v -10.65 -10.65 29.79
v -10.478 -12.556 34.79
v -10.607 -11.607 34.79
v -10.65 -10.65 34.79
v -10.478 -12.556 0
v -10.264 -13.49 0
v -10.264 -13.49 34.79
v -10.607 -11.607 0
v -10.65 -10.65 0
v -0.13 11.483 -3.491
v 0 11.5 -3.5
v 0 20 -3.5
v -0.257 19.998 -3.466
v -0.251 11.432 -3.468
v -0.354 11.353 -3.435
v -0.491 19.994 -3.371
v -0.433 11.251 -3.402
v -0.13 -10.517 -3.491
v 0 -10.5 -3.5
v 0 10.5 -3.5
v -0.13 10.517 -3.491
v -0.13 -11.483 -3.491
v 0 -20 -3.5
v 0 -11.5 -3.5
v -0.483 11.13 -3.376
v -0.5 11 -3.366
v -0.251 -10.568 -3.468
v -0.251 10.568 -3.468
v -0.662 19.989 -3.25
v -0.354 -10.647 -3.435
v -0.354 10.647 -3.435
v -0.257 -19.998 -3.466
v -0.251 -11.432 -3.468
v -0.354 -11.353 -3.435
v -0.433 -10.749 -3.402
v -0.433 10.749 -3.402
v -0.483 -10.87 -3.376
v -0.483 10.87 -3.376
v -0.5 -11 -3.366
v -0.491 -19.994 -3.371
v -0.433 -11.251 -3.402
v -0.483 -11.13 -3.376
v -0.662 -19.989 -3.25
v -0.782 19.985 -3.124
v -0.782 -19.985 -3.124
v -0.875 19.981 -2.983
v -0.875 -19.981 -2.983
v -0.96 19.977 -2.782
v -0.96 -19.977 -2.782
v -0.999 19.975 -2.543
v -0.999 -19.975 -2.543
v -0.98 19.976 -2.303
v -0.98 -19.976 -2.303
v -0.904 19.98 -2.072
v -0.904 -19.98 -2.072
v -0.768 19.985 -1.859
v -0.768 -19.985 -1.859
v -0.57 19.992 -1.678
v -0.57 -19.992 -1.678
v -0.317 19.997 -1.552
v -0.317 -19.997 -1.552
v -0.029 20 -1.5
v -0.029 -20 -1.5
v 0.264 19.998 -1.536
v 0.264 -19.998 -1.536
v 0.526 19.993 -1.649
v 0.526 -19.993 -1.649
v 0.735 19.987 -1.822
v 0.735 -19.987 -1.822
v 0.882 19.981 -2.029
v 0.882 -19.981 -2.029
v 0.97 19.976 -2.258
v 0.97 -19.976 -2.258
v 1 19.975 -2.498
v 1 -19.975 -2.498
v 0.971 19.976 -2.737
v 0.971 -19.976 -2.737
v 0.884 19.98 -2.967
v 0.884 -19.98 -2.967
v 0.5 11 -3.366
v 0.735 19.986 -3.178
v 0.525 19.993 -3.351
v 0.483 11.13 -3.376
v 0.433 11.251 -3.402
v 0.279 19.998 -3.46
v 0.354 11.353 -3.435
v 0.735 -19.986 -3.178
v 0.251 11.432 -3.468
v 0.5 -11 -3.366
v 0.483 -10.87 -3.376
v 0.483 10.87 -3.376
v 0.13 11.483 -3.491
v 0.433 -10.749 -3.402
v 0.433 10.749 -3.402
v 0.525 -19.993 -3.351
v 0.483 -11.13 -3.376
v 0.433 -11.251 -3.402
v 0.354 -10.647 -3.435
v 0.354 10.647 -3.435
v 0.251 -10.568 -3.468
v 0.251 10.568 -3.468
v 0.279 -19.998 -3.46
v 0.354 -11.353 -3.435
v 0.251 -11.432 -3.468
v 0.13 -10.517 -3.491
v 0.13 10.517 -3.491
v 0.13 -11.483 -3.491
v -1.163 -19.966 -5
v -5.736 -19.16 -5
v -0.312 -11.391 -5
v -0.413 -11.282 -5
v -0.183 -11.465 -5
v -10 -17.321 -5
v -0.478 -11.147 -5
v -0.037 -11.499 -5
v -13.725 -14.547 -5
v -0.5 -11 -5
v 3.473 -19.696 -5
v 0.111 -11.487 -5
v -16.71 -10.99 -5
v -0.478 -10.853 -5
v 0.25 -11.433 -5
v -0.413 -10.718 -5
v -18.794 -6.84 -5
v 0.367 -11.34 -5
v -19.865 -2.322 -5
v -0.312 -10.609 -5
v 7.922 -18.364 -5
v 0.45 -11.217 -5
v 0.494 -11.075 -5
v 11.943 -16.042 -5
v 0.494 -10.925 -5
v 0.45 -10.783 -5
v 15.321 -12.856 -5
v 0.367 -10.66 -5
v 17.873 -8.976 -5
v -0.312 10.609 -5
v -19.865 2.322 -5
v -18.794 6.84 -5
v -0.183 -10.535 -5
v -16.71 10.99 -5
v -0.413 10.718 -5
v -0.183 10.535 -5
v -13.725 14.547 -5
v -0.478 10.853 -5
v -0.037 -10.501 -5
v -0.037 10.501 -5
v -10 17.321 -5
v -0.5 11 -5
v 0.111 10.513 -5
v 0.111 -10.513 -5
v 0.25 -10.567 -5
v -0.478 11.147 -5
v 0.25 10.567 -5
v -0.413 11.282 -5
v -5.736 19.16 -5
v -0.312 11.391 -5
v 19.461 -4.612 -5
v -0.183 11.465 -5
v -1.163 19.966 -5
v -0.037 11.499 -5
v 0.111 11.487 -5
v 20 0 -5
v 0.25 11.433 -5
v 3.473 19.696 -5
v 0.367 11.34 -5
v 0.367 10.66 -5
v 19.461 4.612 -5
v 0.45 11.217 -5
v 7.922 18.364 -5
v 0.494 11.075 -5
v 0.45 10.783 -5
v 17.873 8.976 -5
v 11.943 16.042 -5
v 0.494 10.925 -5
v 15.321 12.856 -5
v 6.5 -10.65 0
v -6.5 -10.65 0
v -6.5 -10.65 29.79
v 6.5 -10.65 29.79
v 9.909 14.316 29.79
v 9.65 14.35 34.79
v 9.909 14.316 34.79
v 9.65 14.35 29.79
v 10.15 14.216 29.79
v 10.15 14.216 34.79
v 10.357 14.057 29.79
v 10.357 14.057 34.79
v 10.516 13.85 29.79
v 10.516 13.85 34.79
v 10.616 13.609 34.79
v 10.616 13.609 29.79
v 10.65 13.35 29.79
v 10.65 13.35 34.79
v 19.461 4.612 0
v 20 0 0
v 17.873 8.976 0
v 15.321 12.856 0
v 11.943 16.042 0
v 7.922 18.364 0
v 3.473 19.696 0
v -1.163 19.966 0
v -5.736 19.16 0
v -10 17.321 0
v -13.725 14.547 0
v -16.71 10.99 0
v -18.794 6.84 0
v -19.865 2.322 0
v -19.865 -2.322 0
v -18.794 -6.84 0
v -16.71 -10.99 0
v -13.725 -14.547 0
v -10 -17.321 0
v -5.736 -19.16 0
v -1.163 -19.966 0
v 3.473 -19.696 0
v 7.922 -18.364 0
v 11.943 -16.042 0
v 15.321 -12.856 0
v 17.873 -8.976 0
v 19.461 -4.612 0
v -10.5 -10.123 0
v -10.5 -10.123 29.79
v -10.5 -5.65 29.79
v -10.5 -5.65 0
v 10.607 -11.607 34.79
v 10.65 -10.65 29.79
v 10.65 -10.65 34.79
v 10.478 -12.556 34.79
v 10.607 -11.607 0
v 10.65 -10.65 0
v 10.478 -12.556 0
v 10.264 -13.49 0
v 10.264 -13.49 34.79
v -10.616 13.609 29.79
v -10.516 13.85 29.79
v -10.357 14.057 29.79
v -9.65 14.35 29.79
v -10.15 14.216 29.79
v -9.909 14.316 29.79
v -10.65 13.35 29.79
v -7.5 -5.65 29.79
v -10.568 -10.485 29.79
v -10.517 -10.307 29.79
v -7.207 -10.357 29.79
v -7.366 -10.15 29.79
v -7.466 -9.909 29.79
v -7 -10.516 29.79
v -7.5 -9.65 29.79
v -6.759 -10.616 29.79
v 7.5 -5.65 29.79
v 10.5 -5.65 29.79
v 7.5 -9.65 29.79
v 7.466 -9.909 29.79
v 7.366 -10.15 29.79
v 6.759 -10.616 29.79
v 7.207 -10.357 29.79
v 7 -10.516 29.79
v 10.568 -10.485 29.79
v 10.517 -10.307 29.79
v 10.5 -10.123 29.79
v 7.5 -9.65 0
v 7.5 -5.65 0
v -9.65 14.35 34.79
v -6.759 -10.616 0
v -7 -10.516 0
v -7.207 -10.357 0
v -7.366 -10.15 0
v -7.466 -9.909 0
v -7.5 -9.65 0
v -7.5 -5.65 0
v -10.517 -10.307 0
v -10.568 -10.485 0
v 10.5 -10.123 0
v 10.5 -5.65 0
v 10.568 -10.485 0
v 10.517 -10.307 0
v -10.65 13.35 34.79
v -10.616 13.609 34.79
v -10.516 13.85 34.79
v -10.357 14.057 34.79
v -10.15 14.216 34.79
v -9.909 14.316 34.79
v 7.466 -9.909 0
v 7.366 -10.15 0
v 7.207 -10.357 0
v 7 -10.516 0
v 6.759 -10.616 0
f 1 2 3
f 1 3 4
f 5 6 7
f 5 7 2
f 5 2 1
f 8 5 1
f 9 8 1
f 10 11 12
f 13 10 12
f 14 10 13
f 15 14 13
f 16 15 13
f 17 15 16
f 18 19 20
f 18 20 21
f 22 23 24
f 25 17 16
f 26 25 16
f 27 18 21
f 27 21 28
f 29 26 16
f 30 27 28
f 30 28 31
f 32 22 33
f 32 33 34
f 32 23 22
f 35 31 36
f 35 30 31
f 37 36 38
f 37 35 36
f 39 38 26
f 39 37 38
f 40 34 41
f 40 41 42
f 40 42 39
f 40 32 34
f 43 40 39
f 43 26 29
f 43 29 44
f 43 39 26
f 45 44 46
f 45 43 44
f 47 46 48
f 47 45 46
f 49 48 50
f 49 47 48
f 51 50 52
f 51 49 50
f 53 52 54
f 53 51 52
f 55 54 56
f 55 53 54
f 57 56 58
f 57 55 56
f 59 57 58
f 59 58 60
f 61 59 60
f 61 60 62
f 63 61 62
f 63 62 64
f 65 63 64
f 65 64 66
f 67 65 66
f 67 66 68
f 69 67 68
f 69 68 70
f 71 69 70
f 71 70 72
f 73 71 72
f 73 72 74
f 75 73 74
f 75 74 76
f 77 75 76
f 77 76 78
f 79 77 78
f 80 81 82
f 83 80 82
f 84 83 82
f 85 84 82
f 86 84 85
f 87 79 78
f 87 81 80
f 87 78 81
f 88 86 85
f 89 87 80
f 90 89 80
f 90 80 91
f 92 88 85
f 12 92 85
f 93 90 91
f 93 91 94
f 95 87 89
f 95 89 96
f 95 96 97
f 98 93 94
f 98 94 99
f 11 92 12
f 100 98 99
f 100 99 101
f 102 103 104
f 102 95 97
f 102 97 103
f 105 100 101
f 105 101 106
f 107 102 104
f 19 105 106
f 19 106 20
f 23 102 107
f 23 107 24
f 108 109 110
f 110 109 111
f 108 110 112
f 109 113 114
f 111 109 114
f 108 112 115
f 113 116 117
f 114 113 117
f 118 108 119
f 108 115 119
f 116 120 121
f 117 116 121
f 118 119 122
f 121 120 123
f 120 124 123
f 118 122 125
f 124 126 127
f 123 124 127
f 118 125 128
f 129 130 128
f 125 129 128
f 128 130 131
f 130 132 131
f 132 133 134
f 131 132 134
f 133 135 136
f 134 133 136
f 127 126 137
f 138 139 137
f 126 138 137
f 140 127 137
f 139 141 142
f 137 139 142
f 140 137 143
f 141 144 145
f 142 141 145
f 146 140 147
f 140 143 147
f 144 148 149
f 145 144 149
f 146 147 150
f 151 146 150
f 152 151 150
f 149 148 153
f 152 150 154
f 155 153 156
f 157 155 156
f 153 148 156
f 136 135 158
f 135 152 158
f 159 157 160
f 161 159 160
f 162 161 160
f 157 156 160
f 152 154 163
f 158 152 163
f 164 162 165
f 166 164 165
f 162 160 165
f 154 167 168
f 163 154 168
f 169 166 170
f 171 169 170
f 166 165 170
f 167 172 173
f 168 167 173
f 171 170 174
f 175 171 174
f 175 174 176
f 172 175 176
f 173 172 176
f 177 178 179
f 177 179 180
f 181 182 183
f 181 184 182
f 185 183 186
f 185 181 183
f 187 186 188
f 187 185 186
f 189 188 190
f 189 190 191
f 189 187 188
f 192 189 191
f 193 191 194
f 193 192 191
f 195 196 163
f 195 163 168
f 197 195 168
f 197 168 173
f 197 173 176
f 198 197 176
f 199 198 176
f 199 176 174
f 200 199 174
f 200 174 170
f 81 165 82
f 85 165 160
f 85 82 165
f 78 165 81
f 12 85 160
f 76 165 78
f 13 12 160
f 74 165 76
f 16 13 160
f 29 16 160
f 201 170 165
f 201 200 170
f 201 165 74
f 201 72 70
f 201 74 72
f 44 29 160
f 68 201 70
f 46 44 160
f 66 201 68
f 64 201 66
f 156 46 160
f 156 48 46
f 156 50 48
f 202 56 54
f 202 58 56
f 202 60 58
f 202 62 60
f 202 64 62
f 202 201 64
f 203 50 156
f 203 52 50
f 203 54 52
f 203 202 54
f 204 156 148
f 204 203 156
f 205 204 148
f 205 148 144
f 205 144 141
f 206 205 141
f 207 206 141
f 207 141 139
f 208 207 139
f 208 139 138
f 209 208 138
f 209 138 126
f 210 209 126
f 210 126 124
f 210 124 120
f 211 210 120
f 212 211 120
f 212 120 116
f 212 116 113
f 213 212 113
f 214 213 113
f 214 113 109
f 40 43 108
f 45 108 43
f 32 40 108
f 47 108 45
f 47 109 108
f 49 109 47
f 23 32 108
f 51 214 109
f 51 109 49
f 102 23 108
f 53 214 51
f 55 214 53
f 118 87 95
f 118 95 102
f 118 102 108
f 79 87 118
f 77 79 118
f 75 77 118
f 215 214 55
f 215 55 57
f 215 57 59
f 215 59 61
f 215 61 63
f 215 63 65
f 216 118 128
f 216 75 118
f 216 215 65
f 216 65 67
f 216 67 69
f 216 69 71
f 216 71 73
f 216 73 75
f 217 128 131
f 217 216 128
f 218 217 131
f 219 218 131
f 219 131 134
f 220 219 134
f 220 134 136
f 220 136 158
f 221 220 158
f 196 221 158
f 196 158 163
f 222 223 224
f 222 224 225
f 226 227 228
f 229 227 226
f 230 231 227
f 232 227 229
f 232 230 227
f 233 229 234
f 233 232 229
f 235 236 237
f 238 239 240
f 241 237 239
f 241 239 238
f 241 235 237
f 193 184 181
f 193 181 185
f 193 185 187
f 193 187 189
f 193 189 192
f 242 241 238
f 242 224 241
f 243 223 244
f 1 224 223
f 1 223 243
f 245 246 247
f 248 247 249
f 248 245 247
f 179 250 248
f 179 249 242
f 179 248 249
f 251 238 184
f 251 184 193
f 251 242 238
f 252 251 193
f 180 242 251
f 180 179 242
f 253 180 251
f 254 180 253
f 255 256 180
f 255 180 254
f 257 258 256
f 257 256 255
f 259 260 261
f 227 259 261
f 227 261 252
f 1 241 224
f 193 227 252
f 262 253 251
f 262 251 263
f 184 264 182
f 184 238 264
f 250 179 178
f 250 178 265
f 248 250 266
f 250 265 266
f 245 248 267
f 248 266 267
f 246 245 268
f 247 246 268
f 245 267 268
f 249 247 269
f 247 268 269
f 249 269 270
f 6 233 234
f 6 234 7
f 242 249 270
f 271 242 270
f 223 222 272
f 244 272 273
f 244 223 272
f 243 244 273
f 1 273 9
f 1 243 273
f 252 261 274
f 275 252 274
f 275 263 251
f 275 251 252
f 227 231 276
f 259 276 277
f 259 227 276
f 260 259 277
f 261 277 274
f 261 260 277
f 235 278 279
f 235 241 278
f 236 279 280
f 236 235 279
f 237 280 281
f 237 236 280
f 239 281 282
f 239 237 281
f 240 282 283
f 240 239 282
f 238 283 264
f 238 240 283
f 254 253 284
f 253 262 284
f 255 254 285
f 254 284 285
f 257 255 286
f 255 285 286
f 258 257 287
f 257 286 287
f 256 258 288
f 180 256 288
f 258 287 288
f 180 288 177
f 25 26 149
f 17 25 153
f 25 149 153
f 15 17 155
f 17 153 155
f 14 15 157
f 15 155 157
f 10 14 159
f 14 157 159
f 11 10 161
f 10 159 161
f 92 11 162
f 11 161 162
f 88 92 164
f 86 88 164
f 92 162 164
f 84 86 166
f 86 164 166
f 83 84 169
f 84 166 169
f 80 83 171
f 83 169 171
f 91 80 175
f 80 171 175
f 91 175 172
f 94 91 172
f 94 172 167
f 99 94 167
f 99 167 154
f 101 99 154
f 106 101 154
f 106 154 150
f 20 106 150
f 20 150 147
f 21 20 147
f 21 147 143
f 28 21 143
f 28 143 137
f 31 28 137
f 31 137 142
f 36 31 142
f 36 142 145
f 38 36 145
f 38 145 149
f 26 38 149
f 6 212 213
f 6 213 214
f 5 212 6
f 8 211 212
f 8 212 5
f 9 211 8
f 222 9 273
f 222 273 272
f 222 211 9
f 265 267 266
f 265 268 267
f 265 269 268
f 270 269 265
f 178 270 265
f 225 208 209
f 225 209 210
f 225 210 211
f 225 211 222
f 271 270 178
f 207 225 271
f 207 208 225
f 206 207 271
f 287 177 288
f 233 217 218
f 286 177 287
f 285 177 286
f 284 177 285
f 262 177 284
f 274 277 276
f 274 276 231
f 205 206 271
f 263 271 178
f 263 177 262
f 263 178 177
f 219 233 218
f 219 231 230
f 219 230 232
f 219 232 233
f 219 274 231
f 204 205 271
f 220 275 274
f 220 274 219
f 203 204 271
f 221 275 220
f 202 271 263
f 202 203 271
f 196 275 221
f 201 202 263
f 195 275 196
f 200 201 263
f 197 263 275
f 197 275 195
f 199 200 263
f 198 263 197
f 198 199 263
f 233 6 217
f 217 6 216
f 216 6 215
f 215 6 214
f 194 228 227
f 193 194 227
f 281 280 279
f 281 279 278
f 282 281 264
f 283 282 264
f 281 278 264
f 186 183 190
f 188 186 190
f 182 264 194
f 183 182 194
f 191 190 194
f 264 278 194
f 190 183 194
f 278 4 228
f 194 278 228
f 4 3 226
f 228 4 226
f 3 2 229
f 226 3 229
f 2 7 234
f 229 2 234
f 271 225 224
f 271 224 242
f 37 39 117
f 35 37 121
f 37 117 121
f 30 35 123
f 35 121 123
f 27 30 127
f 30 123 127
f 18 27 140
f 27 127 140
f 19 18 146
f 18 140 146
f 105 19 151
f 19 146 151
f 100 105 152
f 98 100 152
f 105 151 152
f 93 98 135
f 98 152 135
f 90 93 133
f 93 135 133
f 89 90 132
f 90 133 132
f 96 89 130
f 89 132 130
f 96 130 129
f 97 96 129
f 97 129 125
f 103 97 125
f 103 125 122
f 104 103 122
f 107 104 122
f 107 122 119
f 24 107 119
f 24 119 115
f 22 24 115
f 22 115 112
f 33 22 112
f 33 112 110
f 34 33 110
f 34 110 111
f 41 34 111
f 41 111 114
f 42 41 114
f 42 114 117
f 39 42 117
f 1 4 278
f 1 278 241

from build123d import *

# Parameters (mm, degrees)
SKETCH1_R               = 20
BOSS_EXTRUDE1_DEPTH     = 5
BOSS_EXTRUDE2_DEPTH     = 34.79
SKETCH3_W               = 21.3
SKETCH3_H               = 5
BOSS_EXTRUDE3_DEPTH     = 25
SKETCH4_W               = 3
SKETCH4_H               = 29.79
BOSS_EXTRUDE5_DEPTH     = 5
CUT_EXTRUDE1_DEPTH      = 38
CUT_EXTRUDE1_DEPTH_BACK = 45.836860952
SKETCH5_R               = 1
FILLET1_R               = 1
FILLET2_R               = 1
FILLET3_R               = 1
CUT_EXTRUDE2_REACH      = 50.818
CUT_EXTRUDE2_END_RADIUS = 1
SKETCH6_R               = 0.5


with BuildPart() as part:
    # Sketch1 → Boss-Extrude1 (new body)
    with BuildSketch(Plane.XY):
        Circle(SKETCH1_R)
    extrude(amount=-BOSS_EXTRUDE1_DEPTH)

    # Sketch2 → Boss-Extrude2 (add)
    with BuildSketch(Plane.XY):
        with BuildLine():
            Line((-10.65, -10.65), (10.65, -10.65))
            ThreePointArc((10.65, -10.65), (10.553147336, -12.083032205), (10.264350929, -13.49))
            Line((10.264350929, -13.49), (-10.264350929, -13.49))
            ThreePointArc((-10.264350929, -13.49), (-10.553147336, -12.083032205), (-10.65, -10.65))
        make_face()
    extrude(amount=BOSS_EXTRUDE2_DEPTH)

    # Sketch3 → Boss-Extrude3 (add)
    with BuildSketch(Plane(origin=(0, -10.65, 0), x_dir=(1, 0, 0), z_dir=(0, 1, 0))):
        with Locations((0, -32.29)):
            Rectangle(SKETCH3_W, SKETCH3_H)
    extrude(amount=BOSS_EXTRUDE3_DEPTH)

    # Sketch4 → Boss-Extrude5 (add)
    with BuildSketch(Plane(origin=(0, -10.65, 0), x_dir=(1, 0, 0), z_dir=(0, 1, 0))):
        with Locations((9, -14.895)):
            Rectangle(SKETCH4_W, SKETCH4_H)
        with Locations((-9, -14.895)):
            Rectangle(SKETCH4_W, SKETCH4_H)
    extrude(amount=BOSS_EXTRUDE5_DEPTH)

    # Sketch5 → Cut-Extrude1 (cut, two sides: drawn at the far end of the back side and taken through both)
    with BuildSketch(Plane(origin=(0, 0, 0), x_dir=(1, 0, 0), z_dir=(0, 1, 0)).offset(-CUT_EXTRUDE1_DEPTH_BACK)):
        with Locations(Location((0, 2.5, 0), (0, 0, 90))):
            Circle(SKETCH5_R)
    extrude(amount=CUT_EXTRUDE1_DEPTH + CUT_EXTRUDE1_DEPTH_BACK, mode=Mode.SUBTRACT)

    # Fillet1
    fillet1_edges = [part.edges().sort_by_distance(p)[0] for p in [
        (10.65, 14.35, 32.29),
        (-10.65, 14.35, 32.29),
    ]]
    fillet(fillet1_edges, radius=FILLET1_R)

    # Fillet2
    fillet2_edges = [part.edges().sort_by_distance(p)[0] for p in [
        (7.5, -10.65, 14.895),
        (-7.5, -10.65, 14.895),
    ]]
    fillet(fillet2_edges, radius=FILLET2_R)

    # Fillet3
    # the kernel refuses this fillet: 1 mm, written as the material it adds along each edge
    with BuildSketch(Plane(origin=(10.5, -10.65, 31.106956719), x_dir=(0, 1, 0), z_dir=(0, 0, -1))) as fillet3_piece_1:
        with BuildLine():
            CenterArc((0.526782688, 1), FILLET3_R, 238.211669382, 31.788330618)
            Line((0, 0.15), (-0.010535654, 0.133))
            ThreePointArc((-0.010535654, 0.133), (-0.02, 0.075), (-0.02, 0))
            Line((-0.02, 0), (0, -0.02))
            Line((0, -0.02), (0.526782688, -0.02))
            Line((0.526782688, -0.02), (0.526782688, 0))
        make_face()
    extrude(amount=32.423913438)
    with BuildSketch(Plane(origin=(-10.5, -10.65, 31.106956719), x_dir=(0, 1, 0), z_dir=(0, 0, -1))) as fillet3_piece_2:
        with BuildLine():
            CenterArc((0.526782688, -1), FILLET3_R, 90, 31.788330618)
            Line((0, -0.15), (-0.010535654, -0.133))
            ThreePointArc((-0.010535654, -0.133), (-0.02, -0.075), (-0.02, 0))
            Line((-0.02, 0), (0, 0.02))
            Line((0, 0.02), (0.526782688, 0.02))
            Line((0.526782688, 0.02), (0.526782688, 0))
        make_face()
    extrude(amount=32.423913438)

    # Cut-Extrude2: up to this cylinder (the profile starts outside it)
    cut_extrude2_end = Plane(origin=(0, 0, -2.5), z_dir=(0, -1, 0)) * Cylinder(CUT_EXTRUDE2_END_RADIUS, 126.636, mode=Mode.PRIVATE)
    # Sketch6 → Cut-Extrude2 (cut, up to the surface)
    with BuildSketch(Plane(origin=(0, 0, -5), x_dir=(-1, 0, 0), z_dir=(0, 0, -1)), mode=Mode.PRIVATE) as cut_extrude2_sk1:
        with Locations((0, 11)):
            Circle(SKETCH6_R)
    cut_extrude2_tool1 = extrude(cut_extrude2_sk1.sketch, amount=-CUT_EXTRUDE2_REACH, mode=Mode.PRIVATE) - cut_extrude2_end
    add(cut_extrude2_tool1.solids().sort_by_distance((0, 11, -5))[0], mode=Mode.SUBTRACT)
    # Sketch6 → Cut-Extrude2 (cut, up to the surface)
    with BuildSketch(Plane(origin=(0, 0, -5), x_dir=(-1, 0, 0), z_dir=(0, 0, -1)), mode=Mode.PRIVATE) as cut_extrude2_sk2:
        with Locations((0, -11)):
            Circle(SKETCH6_R)
    cut_extrude2_tool2 = extrude(cut_extrude2_sk2.sketch, amount=-CUT_EXTRUDE2_REACH, mode=Mode.PRIVATE) - cut_extrude2_end
    add(cut_extrude2_tool2.solids().sort_by_distance((0, -11, -5))[0], mode=Mode.SUBTRACT)


solid = part.part
